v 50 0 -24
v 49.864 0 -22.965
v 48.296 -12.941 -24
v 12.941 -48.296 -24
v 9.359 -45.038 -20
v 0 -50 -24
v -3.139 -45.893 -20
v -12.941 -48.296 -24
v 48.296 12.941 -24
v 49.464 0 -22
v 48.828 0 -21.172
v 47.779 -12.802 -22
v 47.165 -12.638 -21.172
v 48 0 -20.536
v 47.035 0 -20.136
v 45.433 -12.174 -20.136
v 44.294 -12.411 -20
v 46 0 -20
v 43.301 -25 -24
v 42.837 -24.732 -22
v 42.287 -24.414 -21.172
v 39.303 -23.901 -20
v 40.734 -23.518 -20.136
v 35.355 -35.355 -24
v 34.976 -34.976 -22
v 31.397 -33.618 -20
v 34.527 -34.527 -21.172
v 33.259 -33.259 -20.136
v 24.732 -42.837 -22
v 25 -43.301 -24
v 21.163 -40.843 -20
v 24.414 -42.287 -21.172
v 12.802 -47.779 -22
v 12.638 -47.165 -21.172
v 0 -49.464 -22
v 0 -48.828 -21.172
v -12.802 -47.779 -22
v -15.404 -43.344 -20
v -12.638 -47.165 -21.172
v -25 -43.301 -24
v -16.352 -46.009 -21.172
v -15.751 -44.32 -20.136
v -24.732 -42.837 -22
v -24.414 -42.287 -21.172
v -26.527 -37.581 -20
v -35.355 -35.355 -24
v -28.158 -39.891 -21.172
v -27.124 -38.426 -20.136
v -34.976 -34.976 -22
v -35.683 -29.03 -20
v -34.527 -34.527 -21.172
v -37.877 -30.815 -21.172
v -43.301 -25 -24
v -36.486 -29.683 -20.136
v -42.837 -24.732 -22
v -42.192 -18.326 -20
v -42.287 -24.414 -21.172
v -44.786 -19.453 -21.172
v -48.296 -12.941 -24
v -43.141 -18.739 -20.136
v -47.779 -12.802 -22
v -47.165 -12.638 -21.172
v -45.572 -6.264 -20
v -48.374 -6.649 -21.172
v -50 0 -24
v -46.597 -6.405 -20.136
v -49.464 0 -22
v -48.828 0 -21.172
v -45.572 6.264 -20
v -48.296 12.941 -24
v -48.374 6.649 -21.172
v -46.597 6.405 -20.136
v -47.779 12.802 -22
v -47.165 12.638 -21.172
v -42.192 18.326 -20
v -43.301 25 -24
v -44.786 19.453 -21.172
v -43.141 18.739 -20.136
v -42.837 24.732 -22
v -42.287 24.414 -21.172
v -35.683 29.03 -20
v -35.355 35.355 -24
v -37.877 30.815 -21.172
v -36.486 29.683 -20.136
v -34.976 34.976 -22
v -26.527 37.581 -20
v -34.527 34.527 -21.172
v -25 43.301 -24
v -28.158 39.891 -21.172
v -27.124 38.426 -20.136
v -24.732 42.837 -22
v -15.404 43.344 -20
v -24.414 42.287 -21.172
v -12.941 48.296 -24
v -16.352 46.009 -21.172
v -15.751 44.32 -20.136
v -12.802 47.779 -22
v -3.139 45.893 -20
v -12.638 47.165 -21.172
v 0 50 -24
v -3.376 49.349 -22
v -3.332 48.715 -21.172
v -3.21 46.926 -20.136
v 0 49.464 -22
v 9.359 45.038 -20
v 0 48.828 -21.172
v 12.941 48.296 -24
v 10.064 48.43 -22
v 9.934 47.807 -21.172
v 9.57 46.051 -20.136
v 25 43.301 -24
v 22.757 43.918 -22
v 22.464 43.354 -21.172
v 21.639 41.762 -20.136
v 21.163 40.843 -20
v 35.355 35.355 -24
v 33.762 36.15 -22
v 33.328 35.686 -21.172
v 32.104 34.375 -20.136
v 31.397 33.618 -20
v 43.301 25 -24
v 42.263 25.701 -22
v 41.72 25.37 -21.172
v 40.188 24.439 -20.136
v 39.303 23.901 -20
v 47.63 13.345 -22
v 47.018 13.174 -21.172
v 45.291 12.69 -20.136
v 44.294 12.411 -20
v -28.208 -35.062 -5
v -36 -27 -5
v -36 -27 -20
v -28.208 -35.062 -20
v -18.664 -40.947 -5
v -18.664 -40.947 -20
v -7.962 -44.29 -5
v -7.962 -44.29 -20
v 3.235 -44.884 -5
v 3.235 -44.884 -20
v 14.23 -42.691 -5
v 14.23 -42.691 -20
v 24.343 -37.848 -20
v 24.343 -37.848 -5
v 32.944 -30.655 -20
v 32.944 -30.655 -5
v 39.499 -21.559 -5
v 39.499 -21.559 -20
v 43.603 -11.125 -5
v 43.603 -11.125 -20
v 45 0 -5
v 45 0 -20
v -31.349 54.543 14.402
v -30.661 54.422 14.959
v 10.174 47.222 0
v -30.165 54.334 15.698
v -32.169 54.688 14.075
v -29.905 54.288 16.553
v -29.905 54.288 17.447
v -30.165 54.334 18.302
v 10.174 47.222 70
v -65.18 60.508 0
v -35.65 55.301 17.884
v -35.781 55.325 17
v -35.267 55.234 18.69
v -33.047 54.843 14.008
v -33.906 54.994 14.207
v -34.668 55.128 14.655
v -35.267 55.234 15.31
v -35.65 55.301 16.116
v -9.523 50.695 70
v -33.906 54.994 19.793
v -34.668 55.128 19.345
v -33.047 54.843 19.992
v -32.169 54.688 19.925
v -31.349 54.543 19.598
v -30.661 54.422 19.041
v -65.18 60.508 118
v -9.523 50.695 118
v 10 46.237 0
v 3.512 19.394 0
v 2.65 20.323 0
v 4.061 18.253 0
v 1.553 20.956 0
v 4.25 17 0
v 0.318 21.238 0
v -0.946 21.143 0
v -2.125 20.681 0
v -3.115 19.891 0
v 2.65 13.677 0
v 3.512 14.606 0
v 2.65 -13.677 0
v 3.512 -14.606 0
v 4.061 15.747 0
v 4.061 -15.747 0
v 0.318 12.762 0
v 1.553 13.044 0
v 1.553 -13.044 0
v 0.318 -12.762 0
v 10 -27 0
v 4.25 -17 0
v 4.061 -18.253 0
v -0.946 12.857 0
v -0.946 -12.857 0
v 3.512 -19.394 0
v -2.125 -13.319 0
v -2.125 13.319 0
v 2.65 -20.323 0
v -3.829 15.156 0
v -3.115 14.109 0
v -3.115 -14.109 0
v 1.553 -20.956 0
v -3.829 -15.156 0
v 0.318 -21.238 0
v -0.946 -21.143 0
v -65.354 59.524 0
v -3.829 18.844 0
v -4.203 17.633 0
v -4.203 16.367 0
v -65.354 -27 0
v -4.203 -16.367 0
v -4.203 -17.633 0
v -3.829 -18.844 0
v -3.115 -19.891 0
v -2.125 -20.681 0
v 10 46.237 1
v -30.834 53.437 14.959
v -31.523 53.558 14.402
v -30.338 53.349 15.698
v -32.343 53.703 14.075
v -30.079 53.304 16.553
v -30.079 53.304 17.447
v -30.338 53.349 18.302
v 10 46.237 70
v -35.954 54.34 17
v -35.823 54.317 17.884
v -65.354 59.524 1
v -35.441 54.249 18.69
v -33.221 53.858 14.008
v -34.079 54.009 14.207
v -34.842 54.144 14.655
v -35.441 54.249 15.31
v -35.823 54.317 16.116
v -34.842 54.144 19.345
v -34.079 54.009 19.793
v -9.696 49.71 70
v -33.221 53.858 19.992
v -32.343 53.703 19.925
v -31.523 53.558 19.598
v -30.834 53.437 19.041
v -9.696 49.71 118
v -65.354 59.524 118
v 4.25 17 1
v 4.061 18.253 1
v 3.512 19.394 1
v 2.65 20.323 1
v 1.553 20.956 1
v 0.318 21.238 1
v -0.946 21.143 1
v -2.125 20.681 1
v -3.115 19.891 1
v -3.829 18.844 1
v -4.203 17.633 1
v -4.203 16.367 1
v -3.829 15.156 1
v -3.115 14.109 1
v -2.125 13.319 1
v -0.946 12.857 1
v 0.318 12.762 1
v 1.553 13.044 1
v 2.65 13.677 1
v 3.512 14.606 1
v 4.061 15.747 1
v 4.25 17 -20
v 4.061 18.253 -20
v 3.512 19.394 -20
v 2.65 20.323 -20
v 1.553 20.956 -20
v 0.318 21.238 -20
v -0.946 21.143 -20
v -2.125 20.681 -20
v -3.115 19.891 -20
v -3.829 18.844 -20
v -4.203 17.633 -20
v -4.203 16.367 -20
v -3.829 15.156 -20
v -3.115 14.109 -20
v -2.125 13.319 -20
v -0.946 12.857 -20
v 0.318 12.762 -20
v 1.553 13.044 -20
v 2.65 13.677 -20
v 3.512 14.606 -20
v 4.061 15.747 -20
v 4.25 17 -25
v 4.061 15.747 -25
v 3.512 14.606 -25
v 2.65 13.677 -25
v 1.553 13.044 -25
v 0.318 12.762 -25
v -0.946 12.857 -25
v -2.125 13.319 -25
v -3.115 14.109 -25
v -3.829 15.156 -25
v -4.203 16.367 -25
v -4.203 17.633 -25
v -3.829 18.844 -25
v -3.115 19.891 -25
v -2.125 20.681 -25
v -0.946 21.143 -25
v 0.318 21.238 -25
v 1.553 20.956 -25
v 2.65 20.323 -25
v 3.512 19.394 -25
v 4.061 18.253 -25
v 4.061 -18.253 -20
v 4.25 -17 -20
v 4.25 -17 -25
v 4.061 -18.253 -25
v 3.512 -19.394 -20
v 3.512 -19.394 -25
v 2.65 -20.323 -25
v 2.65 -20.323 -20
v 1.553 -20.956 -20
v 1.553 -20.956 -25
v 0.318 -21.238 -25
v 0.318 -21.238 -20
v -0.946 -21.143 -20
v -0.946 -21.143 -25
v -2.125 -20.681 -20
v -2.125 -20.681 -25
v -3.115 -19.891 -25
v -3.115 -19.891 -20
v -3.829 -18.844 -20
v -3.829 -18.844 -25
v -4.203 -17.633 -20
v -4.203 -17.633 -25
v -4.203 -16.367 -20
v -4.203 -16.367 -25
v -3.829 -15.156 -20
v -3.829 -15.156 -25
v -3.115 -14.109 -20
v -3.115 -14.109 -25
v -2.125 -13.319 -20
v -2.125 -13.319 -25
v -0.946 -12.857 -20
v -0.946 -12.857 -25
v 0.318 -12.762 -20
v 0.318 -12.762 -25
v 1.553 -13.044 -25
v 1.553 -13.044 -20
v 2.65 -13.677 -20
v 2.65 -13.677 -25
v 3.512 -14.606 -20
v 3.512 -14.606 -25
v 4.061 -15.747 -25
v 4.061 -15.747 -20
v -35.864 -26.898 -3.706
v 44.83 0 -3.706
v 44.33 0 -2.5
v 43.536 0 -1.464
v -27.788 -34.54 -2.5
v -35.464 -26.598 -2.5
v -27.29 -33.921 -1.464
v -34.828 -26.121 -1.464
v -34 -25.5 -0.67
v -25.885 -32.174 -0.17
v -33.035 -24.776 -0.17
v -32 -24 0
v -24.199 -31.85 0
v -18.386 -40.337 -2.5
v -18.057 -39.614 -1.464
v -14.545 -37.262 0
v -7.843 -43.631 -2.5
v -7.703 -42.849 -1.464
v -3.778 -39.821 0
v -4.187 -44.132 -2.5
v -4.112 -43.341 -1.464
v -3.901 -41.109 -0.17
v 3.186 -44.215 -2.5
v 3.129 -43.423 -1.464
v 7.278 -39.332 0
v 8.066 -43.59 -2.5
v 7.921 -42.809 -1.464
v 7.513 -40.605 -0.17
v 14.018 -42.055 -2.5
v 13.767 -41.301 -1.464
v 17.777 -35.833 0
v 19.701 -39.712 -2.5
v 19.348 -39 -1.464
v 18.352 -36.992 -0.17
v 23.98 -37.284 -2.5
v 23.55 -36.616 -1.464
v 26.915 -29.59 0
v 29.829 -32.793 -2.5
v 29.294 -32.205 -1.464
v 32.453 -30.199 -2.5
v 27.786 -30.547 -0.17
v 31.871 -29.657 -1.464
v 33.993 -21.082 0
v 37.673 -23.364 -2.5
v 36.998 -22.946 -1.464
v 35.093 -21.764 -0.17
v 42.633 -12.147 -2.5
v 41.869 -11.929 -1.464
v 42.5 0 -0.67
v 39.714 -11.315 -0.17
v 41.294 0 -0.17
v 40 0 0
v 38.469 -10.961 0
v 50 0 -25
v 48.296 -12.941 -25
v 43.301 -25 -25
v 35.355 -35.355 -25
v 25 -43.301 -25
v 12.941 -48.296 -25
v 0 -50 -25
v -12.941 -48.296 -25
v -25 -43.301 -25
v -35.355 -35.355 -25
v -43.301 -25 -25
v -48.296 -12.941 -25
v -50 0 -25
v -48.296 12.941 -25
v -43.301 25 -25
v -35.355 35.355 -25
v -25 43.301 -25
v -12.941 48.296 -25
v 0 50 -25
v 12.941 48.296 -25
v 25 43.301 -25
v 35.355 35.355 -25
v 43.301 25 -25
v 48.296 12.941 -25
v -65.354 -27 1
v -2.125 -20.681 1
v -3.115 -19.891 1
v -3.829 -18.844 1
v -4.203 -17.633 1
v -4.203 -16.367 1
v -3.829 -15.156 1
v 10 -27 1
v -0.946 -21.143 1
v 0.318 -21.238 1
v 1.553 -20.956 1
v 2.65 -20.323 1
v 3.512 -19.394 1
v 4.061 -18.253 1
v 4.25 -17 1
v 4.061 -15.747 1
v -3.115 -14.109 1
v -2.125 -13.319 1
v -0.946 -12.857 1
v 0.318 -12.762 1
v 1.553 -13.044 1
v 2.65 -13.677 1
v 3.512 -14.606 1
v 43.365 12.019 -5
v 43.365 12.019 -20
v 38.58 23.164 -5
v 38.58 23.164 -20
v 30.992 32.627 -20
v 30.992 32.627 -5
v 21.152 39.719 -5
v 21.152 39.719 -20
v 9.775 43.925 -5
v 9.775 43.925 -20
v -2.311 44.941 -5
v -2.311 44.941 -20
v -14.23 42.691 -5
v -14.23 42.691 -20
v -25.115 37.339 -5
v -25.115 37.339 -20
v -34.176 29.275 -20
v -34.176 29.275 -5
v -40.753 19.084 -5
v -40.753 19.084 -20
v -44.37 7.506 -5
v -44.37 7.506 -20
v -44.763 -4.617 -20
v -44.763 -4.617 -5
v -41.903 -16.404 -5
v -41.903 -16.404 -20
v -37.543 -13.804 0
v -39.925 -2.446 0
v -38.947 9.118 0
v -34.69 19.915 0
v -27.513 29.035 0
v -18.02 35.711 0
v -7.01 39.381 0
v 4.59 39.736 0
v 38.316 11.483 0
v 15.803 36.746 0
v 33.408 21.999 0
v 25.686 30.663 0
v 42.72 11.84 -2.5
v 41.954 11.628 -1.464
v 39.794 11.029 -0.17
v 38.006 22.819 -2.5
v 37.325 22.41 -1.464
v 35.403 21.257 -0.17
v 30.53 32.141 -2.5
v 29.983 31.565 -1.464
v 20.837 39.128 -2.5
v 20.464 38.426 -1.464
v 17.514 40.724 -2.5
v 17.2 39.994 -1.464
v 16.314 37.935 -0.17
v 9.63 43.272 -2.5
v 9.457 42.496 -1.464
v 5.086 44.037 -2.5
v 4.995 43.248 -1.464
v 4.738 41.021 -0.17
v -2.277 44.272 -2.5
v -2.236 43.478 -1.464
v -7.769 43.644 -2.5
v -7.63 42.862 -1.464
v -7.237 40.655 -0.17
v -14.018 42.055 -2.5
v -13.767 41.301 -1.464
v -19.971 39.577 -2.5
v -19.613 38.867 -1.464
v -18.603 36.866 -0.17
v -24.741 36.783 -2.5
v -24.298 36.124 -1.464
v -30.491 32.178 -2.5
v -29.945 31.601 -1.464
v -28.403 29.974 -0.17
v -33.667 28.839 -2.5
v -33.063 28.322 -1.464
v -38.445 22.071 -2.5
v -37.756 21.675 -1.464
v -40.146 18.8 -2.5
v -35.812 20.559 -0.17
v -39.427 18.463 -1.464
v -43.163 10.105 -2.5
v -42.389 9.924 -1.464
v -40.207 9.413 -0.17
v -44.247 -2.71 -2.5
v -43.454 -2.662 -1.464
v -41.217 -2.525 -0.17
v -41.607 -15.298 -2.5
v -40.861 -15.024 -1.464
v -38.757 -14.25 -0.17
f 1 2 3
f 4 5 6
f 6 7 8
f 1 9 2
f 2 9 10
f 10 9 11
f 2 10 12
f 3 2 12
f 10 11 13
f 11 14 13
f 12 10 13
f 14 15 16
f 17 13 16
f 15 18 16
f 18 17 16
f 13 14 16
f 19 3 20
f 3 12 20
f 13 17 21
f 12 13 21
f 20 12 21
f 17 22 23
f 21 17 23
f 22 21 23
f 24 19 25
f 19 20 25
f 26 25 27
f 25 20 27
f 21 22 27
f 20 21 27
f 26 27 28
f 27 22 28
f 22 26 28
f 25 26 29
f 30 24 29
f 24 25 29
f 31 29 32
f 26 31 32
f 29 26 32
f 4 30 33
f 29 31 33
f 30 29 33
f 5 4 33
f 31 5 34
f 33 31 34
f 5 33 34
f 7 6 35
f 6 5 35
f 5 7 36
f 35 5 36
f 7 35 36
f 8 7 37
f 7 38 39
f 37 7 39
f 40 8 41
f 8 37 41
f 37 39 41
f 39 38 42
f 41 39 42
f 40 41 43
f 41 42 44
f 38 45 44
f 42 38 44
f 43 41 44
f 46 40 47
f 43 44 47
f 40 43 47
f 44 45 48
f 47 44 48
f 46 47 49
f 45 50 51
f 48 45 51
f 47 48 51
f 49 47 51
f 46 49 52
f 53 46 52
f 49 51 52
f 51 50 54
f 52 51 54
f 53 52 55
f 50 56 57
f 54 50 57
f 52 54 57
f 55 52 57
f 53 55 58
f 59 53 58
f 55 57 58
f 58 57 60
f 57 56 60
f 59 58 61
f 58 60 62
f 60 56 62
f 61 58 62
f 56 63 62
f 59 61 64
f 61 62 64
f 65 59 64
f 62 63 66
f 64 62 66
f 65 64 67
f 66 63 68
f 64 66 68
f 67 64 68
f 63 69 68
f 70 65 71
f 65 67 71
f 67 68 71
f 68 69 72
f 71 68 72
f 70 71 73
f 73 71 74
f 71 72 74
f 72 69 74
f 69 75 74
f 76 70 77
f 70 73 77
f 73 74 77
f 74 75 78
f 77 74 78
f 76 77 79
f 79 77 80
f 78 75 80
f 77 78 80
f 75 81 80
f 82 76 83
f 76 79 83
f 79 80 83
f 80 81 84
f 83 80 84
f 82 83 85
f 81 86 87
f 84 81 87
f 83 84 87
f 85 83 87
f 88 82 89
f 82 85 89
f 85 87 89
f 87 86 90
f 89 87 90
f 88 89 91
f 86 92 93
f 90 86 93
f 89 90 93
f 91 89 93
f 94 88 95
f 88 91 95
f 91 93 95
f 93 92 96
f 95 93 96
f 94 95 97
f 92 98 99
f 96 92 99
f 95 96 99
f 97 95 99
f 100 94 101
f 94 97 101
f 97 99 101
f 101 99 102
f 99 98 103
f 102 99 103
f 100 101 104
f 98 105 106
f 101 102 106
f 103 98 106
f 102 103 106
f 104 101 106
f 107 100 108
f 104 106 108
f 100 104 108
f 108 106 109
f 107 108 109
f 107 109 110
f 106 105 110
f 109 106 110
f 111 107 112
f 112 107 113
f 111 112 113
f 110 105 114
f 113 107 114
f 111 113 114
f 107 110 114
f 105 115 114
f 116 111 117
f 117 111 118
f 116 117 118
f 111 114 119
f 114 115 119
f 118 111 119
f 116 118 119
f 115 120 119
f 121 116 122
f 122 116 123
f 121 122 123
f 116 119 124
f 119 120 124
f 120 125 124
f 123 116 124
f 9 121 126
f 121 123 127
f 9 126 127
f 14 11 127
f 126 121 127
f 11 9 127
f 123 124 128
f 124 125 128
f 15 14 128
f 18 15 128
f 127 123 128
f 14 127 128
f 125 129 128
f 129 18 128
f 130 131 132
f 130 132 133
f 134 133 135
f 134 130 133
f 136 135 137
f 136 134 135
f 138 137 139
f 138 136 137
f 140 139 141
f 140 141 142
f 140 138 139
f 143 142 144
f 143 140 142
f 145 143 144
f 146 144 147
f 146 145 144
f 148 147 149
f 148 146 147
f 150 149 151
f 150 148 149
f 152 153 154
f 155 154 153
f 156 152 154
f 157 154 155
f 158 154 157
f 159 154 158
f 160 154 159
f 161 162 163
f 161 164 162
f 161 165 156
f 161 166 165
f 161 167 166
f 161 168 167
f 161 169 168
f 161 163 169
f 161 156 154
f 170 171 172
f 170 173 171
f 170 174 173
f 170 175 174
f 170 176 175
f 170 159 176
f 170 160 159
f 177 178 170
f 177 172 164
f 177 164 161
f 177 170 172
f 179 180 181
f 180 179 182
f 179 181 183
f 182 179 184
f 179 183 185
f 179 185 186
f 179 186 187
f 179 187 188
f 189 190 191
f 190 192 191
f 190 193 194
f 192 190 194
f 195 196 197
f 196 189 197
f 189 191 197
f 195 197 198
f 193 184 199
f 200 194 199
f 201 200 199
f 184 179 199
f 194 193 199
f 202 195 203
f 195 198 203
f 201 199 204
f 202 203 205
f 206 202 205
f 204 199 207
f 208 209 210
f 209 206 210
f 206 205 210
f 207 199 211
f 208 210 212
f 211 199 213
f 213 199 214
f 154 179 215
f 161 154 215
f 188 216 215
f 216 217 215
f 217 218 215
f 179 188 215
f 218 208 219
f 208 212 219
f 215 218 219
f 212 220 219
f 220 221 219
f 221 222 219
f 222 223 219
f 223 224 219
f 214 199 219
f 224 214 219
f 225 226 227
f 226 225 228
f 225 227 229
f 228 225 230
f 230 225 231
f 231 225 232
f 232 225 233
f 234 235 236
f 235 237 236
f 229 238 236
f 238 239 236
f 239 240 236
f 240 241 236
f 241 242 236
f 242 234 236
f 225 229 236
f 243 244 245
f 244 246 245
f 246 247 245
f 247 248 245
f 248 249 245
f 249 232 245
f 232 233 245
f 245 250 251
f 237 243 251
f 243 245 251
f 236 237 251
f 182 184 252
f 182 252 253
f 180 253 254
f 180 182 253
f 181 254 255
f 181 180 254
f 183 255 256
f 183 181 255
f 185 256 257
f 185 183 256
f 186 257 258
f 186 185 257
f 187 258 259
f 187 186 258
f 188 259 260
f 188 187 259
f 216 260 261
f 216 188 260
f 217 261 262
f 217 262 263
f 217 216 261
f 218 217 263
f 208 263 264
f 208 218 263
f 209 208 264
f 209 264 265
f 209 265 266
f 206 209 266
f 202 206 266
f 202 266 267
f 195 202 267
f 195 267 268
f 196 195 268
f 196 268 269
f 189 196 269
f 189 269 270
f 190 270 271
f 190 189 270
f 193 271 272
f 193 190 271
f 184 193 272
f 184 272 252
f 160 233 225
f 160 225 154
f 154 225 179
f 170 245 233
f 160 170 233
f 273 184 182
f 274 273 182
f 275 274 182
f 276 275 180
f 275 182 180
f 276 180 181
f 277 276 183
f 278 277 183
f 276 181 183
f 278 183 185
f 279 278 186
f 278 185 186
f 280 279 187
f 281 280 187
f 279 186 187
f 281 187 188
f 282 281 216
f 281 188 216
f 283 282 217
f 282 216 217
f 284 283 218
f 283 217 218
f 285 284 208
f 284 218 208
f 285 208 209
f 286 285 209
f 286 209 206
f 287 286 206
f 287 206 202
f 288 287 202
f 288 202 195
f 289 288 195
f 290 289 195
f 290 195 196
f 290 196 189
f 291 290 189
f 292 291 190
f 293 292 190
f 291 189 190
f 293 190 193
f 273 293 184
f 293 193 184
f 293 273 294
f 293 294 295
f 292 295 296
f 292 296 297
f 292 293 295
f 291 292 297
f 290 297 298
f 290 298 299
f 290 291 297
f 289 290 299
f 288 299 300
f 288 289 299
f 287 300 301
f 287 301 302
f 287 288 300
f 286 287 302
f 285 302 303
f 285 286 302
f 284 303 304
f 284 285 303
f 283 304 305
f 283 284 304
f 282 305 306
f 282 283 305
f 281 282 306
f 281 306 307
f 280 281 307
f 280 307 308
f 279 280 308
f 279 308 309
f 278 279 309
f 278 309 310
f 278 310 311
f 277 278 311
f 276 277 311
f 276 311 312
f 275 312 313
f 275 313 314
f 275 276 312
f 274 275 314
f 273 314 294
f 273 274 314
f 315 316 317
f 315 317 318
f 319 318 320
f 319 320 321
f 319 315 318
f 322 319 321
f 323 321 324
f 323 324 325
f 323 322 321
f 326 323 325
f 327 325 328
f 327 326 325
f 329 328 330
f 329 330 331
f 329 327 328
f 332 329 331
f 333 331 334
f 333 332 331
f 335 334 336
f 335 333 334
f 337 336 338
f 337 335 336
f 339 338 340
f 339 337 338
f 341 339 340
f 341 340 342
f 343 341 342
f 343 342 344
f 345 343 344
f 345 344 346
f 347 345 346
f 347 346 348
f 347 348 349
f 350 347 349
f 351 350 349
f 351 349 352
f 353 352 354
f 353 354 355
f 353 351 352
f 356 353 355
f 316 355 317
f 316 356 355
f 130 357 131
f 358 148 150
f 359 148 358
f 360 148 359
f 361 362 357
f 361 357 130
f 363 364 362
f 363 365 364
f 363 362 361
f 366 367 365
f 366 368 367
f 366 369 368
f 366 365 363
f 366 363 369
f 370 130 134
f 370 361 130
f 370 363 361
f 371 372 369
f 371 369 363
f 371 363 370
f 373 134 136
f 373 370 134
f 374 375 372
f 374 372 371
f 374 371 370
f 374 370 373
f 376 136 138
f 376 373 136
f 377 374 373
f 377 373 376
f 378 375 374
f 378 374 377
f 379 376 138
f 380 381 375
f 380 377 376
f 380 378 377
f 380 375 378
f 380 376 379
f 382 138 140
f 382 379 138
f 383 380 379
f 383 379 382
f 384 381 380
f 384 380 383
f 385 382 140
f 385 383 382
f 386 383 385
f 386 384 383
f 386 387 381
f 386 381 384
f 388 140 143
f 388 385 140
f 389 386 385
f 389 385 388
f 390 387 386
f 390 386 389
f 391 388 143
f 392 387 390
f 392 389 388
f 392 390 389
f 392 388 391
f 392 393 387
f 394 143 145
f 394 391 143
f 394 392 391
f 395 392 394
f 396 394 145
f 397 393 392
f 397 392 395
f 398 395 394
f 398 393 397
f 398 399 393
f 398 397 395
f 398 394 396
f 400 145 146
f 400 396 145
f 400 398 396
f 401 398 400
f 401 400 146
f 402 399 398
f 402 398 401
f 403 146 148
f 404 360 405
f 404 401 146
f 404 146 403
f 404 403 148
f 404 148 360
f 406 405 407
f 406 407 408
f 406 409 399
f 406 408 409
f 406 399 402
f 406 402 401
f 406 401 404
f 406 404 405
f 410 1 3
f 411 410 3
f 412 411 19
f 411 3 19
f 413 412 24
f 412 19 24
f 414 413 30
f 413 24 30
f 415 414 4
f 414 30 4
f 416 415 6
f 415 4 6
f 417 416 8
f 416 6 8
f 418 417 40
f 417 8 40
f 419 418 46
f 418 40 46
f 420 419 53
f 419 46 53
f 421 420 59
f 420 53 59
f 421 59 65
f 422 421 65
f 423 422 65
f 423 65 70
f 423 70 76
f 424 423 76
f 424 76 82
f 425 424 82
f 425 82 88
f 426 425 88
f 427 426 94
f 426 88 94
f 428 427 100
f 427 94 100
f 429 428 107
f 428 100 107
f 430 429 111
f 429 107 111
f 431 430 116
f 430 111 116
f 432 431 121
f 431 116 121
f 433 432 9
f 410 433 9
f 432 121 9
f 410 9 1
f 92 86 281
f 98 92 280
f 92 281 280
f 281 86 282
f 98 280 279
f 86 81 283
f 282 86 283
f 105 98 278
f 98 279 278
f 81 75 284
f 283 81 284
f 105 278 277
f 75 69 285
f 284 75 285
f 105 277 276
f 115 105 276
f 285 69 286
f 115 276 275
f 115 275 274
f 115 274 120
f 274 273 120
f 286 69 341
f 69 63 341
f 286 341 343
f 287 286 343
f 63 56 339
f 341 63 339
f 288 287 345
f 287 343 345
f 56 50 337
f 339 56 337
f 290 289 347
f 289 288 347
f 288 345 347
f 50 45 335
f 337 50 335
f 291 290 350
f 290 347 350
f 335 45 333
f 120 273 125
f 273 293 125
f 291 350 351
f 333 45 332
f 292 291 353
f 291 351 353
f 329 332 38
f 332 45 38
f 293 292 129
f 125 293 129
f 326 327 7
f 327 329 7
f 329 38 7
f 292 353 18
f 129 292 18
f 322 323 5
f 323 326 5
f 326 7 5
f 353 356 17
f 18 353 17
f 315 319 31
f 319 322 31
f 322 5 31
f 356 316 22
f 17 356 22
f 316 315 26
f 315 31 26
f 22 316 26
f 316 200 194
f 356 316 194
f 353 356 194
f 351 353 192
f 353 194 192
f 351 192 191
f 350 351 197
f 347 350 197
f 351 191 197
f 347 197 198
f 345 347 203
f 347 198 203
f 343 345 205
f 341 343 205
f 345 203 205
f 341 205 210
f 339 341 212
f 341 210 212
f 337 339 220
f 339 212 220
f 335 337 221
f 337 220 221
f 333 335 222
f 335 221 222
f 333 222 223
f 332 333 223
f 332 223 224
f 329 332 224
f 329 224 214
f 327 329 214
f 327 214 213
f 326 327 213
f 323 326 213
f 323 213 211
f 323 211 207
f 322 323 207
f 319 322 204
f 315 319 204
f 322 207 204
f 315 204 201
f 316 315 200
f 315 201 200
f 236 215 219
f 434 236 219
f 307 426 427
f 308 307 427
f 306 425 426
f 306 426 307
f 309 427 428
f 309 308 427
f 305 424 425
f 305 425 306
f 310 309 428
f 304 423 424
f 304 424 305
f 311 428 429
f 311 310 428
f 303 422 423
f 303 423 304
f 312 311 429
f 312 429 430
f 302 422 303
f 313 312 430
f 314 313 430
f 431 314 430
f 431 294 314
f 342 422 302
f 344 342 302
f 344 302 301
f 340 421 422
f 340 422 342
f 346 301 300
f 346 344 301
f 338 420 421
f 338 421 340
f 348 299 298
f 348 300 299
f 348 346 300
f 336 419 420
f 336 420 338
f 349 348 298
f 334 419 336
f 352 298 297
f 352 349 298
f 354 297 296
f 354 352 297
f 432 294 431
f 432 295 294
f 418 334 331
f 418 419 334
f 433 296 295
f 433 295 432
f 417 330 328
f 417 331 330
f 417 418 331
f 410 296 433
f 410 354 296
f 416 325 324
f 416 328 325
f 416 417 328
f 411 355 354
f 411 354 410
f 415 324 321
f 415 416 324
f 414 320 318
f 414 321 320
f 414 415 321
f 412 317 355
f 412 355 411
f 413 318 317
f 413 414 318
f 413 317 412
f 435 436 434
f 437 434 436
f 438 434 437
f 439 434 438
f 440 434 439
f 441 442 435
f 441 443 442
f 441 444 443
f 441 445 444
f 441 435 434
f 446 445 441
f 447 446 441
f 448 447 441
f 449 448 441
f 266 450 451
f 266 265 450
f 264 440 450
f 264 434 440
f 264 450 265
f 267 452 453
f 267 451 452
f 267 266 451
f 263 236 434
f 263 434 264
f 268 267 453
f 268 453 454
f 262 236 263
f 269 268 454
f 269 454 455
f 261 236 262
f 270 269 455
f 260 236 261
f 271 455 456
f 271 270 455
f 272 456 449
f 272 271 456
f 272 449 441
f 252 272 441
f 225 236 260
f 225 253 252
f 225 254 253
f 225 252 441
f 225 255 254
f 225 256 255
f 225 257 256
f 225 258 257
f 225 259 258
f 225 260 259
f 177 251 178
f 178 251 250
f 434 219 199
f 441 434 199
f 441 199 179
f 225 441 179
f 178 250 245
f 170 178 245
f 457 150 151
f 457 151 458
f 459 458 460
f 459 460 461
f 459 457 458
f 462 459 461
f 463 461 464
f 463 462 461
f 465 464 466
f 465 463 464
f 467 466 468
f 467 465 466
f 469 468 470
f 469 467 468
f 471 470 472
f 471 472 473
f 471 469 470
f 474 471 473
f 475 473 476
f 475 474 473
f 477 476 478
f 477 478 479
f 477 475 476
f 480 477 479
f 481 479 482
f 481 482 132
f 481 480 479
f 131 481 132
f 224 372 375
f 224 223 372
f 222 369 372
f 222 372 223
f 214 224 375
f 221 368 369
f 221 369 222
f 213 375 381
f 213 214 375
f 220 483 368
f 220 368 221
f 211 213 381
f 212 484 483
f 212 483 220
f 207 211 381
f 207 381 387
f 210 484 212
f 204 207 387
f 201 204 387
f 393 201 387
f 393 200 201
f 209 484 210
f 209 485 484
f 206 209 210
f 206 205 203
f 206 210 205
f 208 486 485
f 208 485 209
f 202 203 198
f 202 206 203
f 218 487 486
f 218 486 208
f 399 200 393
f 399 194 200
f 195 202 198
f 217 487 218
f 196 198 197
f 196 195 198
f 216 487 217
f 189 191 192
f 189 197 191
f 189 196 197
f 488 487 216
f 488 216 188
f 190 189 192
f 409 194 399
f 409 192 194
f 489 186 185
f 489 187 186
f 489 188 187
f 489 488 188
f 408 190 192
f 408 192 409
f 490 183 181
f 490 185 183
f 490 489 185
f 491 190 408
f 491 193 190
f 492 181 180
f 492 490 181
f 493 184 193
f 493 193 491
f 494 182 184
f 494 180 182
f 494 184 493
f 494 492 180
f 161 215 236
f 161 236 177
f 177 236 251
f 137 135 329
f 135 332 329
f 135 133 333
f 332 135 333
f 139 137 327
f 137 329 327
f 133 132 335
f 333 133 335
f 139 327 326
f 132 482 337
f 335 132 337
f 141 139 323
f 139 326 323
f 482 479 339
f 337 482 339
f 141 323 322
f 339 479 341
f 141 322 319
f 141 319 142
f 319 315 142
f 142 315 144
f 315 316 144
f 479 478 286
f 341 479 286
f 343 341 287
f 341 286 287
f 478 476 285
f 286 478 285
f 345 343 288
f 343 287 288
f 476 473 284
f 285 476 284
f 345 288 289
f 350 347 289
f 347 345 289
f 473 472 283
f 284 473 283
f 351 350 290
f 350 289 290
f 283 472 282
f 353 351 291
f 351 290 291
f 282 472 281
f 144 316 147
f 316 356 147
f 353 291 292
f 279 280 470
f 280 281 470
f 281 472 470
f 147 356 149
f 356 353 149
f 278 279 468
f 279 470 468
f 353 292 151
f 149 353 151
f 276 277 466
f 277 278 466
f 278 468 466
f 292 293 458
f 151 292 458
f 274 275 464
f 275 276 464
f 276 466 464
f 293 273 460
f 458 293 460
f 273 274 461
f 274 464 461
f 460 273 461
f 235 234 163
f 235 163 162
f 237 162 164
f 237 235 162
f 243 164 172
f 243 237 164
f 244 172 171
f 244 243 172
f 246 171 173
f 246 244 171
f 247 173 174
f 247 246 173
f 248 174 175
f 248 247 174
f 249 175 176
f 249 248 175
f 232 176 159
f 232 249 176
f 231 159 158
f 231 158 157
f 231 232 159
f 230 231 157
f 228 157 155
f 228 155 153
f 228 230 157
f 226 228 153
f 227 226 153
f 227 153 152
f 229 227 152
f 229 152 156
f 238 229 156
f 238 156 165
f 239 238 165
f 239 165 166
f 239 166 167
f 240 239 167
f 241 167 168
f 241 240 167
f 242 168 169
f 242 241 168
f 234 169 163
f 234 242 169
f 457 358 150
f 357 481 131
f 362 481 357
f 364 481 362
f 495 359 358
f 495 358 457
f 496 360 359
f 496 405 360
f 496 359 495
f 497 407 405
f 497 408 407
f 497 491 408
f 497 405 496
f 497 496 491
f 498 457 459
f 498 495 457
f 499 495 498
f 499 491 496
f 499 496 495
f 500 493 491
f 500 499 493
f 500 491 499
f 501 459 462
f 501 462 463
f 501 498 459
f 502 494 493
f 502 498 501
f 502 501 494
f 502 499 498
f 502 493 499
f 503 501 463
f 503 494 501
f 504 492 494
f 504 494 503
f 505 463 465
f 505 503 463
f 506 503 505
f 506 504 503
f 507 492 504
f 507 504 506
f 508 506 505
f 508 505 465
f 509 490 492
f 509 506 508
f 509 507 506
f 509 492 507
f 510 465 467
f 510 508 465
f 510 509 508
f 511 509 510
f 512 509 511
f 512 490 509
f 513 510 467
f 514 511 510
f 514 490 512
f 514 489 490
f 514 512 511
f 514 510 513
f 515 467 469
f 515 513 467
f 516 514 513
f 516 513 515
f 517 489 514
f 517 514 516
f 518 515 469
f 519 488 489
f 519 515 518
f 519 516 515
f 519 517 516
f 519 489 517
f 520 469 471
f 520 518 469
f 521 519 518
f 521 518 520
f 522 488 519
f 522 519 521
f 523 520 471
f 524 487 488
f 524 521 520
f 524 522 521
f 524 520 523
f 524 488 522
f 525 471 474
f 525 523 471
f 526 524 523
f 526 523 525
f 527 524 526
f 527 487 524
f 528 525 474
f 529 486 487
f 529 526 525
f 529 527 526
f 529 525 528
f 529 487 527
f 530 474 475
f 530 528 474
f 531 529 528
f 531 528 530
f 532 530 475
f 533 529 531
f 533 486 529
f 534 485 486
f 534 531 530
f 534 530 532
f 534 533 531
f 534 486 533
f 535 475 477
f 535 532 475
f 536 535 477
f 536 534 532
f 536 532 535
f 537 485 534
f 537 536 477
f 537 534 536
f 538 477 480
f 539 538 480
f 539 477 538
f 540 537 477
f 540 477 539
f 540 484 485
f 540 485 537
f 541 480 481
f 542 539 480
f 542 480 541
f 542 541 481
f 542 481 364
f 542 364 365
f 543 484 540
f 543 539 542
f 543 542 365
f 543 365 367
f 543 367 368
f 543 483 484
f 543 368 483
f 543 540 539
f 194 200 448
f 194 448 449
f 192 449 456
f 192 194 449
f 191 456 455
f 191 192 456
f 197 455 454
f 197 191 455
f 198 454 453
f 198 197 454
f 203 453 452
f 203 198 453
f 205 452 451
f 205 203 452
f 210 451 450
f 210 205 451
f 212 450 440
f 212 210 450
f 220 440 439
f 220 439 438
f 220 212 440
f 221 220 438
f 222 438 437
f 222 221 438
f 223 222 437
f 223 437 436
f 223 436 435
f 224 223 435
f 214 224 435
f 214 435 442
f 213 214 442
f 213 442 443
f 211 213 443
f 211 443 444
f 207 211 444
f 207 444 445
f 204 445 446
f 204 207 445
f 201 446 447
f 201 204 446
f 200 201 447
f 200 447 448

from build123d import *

# Parameters (mm, degrees)
F0_R     = 4.25
F1_DEPTH = 20
F2_R     = 5
F3_R     = 50
F3_R_2   = 45
F3_R_3   = 4.25
F4_DEPTH = 5
F5_R     = 4
F6_R     = 4.25
F7_DEPTH = 1
F8_W     = 76.5163908218
F8_H     = 1
F8_R     = 3
F9_DEPTH = 1


# Not quite as in the source:
# - a feature names something its author has since deleted; it is built from what else it names


with BuildPart() as f1:
    # F0 (on Top) → F1 (new body)
    with BuildSketch(Plane.XY):
        with BuildLine():
            Line((10, -27), (10, 43.874821937))
            ThreePointArc((10, 43.874821937), (-37.7466567546, 24.4987735173), (-36, -27))
            Line((-36, -27), (10, -27))
        make_face()
        with Locations((0, -17)):
            Circle(F0_R, mode=Mode.SUBTRACT)
        with Locations((0, 17)):
            Circle(F0_R, mode=Mode.SUBTRACT)
        with BuildLine():
            ThreePointArc((-36, -27), (14.2302494708, -42.6907484123), (45, 0))
            ThreePointArc((45, 0), (35.1781181987, 28.0624304008), (10, 43.874821937))
            Line((10, 43.874821937), (10, -27))
            Line((10, -27), (-36, -27))
        make_face()
    extrude(amount=-F1_DEPTH)

    # F2
    f2_edges = [f1.edges().sort_by_distance(p)[0] for p in [
        (-10, -43.874822, 0),
    ]]
    fillet(f2_edges, radius=F2_R)


with BuildPart() as f4:
    # F3 (on face) → F4 (new body)
    with BuildSketch(Plane(origin=(0, 0, -20), x_dir=(1, 0, 0), z_dir=(0, 0, -1))):
        Circle(F3_R)
        Circle(F3_R_2, mode=Mode.SUBTRACT)
        Circle(F3_R_2)
        with Locations((0, -17)):
            Circle(F3_R_3, mode=Mode.SUBTRACT)
        with Locations((0, 17)):
            Circle(F3_R_3, mode=Mode.SUBTRACT)
    extrude(amount=F4_DEPTH)

    # F5
    f5_edges = [f4.edges().sort_by_distance(p)[0] for p in [
        (-50, 0, -20),
    ]]
    fillet(f5_edges, radius=F5_R)


with BuildPart() as f7:
    # F6 (on face) → F7 (new body)
    with BuildSketch(Plane.XY):
        with BuildLine():
            Line((10, 46.2367301929), (-65.3539349139, 59.5236620208))
            Line((-65.3539349139, 59.5236620208), (-65.3539349139, -27))
            Line((-65.3539349139, -27), (-29.5127091267, -27))
            ThreePointArc((-29.5127091267, -27), (-34.2824912471, 20.6085126561), (10, 38.7298334621))
            Line((10, 38.7298334621), (10, 46.2367301929))
        make_face()
        with BuildLine():
            ThreePointArc((10, 38.7298334621), (-34.2824912471, 20.6085126561), (-29.5127091267, -27))
            Line((-29.5127091267, -27), (10, -27))
            Line((10, -27), (10, 38.7298334621))
        make_face()
        with Locations((0, -17)):
            Circle(F6_R, mode=Mode.SUBTRACT)
        with Locations((0, 17)):
            Circle(F6_R, mode=Mode.SUBTRACT)
    extrude(amount=F7_DEPTH)

    # F8 (on face) → F9 (join)
    with BuildSketch(Plane(origin=(8.2084834398, 46.5526228989, 0), x_dir=(-0.984807753, 0.1736481777, 0), z_dir=(0.1736481777, 0.984807753, 0))):
        with Locations((36.4390418201, 0.5)):
            Rectangle(F8_W, F8_H)
        Polygon((-1.8191535908, 70), (-1.8191535908, 1), (74.697237231, 1), (74.697237231, 118), (18.1808464092, 118), (18.1808464092, 70), align=None)
        with Locations((41.8441907202, 17)):
            Circle(F8_R, mode=Mode.SUBTRACT)
    extrude(amount=F9_DEPTH)


solid = Compound([f1.part, f4.part, f7.part])
